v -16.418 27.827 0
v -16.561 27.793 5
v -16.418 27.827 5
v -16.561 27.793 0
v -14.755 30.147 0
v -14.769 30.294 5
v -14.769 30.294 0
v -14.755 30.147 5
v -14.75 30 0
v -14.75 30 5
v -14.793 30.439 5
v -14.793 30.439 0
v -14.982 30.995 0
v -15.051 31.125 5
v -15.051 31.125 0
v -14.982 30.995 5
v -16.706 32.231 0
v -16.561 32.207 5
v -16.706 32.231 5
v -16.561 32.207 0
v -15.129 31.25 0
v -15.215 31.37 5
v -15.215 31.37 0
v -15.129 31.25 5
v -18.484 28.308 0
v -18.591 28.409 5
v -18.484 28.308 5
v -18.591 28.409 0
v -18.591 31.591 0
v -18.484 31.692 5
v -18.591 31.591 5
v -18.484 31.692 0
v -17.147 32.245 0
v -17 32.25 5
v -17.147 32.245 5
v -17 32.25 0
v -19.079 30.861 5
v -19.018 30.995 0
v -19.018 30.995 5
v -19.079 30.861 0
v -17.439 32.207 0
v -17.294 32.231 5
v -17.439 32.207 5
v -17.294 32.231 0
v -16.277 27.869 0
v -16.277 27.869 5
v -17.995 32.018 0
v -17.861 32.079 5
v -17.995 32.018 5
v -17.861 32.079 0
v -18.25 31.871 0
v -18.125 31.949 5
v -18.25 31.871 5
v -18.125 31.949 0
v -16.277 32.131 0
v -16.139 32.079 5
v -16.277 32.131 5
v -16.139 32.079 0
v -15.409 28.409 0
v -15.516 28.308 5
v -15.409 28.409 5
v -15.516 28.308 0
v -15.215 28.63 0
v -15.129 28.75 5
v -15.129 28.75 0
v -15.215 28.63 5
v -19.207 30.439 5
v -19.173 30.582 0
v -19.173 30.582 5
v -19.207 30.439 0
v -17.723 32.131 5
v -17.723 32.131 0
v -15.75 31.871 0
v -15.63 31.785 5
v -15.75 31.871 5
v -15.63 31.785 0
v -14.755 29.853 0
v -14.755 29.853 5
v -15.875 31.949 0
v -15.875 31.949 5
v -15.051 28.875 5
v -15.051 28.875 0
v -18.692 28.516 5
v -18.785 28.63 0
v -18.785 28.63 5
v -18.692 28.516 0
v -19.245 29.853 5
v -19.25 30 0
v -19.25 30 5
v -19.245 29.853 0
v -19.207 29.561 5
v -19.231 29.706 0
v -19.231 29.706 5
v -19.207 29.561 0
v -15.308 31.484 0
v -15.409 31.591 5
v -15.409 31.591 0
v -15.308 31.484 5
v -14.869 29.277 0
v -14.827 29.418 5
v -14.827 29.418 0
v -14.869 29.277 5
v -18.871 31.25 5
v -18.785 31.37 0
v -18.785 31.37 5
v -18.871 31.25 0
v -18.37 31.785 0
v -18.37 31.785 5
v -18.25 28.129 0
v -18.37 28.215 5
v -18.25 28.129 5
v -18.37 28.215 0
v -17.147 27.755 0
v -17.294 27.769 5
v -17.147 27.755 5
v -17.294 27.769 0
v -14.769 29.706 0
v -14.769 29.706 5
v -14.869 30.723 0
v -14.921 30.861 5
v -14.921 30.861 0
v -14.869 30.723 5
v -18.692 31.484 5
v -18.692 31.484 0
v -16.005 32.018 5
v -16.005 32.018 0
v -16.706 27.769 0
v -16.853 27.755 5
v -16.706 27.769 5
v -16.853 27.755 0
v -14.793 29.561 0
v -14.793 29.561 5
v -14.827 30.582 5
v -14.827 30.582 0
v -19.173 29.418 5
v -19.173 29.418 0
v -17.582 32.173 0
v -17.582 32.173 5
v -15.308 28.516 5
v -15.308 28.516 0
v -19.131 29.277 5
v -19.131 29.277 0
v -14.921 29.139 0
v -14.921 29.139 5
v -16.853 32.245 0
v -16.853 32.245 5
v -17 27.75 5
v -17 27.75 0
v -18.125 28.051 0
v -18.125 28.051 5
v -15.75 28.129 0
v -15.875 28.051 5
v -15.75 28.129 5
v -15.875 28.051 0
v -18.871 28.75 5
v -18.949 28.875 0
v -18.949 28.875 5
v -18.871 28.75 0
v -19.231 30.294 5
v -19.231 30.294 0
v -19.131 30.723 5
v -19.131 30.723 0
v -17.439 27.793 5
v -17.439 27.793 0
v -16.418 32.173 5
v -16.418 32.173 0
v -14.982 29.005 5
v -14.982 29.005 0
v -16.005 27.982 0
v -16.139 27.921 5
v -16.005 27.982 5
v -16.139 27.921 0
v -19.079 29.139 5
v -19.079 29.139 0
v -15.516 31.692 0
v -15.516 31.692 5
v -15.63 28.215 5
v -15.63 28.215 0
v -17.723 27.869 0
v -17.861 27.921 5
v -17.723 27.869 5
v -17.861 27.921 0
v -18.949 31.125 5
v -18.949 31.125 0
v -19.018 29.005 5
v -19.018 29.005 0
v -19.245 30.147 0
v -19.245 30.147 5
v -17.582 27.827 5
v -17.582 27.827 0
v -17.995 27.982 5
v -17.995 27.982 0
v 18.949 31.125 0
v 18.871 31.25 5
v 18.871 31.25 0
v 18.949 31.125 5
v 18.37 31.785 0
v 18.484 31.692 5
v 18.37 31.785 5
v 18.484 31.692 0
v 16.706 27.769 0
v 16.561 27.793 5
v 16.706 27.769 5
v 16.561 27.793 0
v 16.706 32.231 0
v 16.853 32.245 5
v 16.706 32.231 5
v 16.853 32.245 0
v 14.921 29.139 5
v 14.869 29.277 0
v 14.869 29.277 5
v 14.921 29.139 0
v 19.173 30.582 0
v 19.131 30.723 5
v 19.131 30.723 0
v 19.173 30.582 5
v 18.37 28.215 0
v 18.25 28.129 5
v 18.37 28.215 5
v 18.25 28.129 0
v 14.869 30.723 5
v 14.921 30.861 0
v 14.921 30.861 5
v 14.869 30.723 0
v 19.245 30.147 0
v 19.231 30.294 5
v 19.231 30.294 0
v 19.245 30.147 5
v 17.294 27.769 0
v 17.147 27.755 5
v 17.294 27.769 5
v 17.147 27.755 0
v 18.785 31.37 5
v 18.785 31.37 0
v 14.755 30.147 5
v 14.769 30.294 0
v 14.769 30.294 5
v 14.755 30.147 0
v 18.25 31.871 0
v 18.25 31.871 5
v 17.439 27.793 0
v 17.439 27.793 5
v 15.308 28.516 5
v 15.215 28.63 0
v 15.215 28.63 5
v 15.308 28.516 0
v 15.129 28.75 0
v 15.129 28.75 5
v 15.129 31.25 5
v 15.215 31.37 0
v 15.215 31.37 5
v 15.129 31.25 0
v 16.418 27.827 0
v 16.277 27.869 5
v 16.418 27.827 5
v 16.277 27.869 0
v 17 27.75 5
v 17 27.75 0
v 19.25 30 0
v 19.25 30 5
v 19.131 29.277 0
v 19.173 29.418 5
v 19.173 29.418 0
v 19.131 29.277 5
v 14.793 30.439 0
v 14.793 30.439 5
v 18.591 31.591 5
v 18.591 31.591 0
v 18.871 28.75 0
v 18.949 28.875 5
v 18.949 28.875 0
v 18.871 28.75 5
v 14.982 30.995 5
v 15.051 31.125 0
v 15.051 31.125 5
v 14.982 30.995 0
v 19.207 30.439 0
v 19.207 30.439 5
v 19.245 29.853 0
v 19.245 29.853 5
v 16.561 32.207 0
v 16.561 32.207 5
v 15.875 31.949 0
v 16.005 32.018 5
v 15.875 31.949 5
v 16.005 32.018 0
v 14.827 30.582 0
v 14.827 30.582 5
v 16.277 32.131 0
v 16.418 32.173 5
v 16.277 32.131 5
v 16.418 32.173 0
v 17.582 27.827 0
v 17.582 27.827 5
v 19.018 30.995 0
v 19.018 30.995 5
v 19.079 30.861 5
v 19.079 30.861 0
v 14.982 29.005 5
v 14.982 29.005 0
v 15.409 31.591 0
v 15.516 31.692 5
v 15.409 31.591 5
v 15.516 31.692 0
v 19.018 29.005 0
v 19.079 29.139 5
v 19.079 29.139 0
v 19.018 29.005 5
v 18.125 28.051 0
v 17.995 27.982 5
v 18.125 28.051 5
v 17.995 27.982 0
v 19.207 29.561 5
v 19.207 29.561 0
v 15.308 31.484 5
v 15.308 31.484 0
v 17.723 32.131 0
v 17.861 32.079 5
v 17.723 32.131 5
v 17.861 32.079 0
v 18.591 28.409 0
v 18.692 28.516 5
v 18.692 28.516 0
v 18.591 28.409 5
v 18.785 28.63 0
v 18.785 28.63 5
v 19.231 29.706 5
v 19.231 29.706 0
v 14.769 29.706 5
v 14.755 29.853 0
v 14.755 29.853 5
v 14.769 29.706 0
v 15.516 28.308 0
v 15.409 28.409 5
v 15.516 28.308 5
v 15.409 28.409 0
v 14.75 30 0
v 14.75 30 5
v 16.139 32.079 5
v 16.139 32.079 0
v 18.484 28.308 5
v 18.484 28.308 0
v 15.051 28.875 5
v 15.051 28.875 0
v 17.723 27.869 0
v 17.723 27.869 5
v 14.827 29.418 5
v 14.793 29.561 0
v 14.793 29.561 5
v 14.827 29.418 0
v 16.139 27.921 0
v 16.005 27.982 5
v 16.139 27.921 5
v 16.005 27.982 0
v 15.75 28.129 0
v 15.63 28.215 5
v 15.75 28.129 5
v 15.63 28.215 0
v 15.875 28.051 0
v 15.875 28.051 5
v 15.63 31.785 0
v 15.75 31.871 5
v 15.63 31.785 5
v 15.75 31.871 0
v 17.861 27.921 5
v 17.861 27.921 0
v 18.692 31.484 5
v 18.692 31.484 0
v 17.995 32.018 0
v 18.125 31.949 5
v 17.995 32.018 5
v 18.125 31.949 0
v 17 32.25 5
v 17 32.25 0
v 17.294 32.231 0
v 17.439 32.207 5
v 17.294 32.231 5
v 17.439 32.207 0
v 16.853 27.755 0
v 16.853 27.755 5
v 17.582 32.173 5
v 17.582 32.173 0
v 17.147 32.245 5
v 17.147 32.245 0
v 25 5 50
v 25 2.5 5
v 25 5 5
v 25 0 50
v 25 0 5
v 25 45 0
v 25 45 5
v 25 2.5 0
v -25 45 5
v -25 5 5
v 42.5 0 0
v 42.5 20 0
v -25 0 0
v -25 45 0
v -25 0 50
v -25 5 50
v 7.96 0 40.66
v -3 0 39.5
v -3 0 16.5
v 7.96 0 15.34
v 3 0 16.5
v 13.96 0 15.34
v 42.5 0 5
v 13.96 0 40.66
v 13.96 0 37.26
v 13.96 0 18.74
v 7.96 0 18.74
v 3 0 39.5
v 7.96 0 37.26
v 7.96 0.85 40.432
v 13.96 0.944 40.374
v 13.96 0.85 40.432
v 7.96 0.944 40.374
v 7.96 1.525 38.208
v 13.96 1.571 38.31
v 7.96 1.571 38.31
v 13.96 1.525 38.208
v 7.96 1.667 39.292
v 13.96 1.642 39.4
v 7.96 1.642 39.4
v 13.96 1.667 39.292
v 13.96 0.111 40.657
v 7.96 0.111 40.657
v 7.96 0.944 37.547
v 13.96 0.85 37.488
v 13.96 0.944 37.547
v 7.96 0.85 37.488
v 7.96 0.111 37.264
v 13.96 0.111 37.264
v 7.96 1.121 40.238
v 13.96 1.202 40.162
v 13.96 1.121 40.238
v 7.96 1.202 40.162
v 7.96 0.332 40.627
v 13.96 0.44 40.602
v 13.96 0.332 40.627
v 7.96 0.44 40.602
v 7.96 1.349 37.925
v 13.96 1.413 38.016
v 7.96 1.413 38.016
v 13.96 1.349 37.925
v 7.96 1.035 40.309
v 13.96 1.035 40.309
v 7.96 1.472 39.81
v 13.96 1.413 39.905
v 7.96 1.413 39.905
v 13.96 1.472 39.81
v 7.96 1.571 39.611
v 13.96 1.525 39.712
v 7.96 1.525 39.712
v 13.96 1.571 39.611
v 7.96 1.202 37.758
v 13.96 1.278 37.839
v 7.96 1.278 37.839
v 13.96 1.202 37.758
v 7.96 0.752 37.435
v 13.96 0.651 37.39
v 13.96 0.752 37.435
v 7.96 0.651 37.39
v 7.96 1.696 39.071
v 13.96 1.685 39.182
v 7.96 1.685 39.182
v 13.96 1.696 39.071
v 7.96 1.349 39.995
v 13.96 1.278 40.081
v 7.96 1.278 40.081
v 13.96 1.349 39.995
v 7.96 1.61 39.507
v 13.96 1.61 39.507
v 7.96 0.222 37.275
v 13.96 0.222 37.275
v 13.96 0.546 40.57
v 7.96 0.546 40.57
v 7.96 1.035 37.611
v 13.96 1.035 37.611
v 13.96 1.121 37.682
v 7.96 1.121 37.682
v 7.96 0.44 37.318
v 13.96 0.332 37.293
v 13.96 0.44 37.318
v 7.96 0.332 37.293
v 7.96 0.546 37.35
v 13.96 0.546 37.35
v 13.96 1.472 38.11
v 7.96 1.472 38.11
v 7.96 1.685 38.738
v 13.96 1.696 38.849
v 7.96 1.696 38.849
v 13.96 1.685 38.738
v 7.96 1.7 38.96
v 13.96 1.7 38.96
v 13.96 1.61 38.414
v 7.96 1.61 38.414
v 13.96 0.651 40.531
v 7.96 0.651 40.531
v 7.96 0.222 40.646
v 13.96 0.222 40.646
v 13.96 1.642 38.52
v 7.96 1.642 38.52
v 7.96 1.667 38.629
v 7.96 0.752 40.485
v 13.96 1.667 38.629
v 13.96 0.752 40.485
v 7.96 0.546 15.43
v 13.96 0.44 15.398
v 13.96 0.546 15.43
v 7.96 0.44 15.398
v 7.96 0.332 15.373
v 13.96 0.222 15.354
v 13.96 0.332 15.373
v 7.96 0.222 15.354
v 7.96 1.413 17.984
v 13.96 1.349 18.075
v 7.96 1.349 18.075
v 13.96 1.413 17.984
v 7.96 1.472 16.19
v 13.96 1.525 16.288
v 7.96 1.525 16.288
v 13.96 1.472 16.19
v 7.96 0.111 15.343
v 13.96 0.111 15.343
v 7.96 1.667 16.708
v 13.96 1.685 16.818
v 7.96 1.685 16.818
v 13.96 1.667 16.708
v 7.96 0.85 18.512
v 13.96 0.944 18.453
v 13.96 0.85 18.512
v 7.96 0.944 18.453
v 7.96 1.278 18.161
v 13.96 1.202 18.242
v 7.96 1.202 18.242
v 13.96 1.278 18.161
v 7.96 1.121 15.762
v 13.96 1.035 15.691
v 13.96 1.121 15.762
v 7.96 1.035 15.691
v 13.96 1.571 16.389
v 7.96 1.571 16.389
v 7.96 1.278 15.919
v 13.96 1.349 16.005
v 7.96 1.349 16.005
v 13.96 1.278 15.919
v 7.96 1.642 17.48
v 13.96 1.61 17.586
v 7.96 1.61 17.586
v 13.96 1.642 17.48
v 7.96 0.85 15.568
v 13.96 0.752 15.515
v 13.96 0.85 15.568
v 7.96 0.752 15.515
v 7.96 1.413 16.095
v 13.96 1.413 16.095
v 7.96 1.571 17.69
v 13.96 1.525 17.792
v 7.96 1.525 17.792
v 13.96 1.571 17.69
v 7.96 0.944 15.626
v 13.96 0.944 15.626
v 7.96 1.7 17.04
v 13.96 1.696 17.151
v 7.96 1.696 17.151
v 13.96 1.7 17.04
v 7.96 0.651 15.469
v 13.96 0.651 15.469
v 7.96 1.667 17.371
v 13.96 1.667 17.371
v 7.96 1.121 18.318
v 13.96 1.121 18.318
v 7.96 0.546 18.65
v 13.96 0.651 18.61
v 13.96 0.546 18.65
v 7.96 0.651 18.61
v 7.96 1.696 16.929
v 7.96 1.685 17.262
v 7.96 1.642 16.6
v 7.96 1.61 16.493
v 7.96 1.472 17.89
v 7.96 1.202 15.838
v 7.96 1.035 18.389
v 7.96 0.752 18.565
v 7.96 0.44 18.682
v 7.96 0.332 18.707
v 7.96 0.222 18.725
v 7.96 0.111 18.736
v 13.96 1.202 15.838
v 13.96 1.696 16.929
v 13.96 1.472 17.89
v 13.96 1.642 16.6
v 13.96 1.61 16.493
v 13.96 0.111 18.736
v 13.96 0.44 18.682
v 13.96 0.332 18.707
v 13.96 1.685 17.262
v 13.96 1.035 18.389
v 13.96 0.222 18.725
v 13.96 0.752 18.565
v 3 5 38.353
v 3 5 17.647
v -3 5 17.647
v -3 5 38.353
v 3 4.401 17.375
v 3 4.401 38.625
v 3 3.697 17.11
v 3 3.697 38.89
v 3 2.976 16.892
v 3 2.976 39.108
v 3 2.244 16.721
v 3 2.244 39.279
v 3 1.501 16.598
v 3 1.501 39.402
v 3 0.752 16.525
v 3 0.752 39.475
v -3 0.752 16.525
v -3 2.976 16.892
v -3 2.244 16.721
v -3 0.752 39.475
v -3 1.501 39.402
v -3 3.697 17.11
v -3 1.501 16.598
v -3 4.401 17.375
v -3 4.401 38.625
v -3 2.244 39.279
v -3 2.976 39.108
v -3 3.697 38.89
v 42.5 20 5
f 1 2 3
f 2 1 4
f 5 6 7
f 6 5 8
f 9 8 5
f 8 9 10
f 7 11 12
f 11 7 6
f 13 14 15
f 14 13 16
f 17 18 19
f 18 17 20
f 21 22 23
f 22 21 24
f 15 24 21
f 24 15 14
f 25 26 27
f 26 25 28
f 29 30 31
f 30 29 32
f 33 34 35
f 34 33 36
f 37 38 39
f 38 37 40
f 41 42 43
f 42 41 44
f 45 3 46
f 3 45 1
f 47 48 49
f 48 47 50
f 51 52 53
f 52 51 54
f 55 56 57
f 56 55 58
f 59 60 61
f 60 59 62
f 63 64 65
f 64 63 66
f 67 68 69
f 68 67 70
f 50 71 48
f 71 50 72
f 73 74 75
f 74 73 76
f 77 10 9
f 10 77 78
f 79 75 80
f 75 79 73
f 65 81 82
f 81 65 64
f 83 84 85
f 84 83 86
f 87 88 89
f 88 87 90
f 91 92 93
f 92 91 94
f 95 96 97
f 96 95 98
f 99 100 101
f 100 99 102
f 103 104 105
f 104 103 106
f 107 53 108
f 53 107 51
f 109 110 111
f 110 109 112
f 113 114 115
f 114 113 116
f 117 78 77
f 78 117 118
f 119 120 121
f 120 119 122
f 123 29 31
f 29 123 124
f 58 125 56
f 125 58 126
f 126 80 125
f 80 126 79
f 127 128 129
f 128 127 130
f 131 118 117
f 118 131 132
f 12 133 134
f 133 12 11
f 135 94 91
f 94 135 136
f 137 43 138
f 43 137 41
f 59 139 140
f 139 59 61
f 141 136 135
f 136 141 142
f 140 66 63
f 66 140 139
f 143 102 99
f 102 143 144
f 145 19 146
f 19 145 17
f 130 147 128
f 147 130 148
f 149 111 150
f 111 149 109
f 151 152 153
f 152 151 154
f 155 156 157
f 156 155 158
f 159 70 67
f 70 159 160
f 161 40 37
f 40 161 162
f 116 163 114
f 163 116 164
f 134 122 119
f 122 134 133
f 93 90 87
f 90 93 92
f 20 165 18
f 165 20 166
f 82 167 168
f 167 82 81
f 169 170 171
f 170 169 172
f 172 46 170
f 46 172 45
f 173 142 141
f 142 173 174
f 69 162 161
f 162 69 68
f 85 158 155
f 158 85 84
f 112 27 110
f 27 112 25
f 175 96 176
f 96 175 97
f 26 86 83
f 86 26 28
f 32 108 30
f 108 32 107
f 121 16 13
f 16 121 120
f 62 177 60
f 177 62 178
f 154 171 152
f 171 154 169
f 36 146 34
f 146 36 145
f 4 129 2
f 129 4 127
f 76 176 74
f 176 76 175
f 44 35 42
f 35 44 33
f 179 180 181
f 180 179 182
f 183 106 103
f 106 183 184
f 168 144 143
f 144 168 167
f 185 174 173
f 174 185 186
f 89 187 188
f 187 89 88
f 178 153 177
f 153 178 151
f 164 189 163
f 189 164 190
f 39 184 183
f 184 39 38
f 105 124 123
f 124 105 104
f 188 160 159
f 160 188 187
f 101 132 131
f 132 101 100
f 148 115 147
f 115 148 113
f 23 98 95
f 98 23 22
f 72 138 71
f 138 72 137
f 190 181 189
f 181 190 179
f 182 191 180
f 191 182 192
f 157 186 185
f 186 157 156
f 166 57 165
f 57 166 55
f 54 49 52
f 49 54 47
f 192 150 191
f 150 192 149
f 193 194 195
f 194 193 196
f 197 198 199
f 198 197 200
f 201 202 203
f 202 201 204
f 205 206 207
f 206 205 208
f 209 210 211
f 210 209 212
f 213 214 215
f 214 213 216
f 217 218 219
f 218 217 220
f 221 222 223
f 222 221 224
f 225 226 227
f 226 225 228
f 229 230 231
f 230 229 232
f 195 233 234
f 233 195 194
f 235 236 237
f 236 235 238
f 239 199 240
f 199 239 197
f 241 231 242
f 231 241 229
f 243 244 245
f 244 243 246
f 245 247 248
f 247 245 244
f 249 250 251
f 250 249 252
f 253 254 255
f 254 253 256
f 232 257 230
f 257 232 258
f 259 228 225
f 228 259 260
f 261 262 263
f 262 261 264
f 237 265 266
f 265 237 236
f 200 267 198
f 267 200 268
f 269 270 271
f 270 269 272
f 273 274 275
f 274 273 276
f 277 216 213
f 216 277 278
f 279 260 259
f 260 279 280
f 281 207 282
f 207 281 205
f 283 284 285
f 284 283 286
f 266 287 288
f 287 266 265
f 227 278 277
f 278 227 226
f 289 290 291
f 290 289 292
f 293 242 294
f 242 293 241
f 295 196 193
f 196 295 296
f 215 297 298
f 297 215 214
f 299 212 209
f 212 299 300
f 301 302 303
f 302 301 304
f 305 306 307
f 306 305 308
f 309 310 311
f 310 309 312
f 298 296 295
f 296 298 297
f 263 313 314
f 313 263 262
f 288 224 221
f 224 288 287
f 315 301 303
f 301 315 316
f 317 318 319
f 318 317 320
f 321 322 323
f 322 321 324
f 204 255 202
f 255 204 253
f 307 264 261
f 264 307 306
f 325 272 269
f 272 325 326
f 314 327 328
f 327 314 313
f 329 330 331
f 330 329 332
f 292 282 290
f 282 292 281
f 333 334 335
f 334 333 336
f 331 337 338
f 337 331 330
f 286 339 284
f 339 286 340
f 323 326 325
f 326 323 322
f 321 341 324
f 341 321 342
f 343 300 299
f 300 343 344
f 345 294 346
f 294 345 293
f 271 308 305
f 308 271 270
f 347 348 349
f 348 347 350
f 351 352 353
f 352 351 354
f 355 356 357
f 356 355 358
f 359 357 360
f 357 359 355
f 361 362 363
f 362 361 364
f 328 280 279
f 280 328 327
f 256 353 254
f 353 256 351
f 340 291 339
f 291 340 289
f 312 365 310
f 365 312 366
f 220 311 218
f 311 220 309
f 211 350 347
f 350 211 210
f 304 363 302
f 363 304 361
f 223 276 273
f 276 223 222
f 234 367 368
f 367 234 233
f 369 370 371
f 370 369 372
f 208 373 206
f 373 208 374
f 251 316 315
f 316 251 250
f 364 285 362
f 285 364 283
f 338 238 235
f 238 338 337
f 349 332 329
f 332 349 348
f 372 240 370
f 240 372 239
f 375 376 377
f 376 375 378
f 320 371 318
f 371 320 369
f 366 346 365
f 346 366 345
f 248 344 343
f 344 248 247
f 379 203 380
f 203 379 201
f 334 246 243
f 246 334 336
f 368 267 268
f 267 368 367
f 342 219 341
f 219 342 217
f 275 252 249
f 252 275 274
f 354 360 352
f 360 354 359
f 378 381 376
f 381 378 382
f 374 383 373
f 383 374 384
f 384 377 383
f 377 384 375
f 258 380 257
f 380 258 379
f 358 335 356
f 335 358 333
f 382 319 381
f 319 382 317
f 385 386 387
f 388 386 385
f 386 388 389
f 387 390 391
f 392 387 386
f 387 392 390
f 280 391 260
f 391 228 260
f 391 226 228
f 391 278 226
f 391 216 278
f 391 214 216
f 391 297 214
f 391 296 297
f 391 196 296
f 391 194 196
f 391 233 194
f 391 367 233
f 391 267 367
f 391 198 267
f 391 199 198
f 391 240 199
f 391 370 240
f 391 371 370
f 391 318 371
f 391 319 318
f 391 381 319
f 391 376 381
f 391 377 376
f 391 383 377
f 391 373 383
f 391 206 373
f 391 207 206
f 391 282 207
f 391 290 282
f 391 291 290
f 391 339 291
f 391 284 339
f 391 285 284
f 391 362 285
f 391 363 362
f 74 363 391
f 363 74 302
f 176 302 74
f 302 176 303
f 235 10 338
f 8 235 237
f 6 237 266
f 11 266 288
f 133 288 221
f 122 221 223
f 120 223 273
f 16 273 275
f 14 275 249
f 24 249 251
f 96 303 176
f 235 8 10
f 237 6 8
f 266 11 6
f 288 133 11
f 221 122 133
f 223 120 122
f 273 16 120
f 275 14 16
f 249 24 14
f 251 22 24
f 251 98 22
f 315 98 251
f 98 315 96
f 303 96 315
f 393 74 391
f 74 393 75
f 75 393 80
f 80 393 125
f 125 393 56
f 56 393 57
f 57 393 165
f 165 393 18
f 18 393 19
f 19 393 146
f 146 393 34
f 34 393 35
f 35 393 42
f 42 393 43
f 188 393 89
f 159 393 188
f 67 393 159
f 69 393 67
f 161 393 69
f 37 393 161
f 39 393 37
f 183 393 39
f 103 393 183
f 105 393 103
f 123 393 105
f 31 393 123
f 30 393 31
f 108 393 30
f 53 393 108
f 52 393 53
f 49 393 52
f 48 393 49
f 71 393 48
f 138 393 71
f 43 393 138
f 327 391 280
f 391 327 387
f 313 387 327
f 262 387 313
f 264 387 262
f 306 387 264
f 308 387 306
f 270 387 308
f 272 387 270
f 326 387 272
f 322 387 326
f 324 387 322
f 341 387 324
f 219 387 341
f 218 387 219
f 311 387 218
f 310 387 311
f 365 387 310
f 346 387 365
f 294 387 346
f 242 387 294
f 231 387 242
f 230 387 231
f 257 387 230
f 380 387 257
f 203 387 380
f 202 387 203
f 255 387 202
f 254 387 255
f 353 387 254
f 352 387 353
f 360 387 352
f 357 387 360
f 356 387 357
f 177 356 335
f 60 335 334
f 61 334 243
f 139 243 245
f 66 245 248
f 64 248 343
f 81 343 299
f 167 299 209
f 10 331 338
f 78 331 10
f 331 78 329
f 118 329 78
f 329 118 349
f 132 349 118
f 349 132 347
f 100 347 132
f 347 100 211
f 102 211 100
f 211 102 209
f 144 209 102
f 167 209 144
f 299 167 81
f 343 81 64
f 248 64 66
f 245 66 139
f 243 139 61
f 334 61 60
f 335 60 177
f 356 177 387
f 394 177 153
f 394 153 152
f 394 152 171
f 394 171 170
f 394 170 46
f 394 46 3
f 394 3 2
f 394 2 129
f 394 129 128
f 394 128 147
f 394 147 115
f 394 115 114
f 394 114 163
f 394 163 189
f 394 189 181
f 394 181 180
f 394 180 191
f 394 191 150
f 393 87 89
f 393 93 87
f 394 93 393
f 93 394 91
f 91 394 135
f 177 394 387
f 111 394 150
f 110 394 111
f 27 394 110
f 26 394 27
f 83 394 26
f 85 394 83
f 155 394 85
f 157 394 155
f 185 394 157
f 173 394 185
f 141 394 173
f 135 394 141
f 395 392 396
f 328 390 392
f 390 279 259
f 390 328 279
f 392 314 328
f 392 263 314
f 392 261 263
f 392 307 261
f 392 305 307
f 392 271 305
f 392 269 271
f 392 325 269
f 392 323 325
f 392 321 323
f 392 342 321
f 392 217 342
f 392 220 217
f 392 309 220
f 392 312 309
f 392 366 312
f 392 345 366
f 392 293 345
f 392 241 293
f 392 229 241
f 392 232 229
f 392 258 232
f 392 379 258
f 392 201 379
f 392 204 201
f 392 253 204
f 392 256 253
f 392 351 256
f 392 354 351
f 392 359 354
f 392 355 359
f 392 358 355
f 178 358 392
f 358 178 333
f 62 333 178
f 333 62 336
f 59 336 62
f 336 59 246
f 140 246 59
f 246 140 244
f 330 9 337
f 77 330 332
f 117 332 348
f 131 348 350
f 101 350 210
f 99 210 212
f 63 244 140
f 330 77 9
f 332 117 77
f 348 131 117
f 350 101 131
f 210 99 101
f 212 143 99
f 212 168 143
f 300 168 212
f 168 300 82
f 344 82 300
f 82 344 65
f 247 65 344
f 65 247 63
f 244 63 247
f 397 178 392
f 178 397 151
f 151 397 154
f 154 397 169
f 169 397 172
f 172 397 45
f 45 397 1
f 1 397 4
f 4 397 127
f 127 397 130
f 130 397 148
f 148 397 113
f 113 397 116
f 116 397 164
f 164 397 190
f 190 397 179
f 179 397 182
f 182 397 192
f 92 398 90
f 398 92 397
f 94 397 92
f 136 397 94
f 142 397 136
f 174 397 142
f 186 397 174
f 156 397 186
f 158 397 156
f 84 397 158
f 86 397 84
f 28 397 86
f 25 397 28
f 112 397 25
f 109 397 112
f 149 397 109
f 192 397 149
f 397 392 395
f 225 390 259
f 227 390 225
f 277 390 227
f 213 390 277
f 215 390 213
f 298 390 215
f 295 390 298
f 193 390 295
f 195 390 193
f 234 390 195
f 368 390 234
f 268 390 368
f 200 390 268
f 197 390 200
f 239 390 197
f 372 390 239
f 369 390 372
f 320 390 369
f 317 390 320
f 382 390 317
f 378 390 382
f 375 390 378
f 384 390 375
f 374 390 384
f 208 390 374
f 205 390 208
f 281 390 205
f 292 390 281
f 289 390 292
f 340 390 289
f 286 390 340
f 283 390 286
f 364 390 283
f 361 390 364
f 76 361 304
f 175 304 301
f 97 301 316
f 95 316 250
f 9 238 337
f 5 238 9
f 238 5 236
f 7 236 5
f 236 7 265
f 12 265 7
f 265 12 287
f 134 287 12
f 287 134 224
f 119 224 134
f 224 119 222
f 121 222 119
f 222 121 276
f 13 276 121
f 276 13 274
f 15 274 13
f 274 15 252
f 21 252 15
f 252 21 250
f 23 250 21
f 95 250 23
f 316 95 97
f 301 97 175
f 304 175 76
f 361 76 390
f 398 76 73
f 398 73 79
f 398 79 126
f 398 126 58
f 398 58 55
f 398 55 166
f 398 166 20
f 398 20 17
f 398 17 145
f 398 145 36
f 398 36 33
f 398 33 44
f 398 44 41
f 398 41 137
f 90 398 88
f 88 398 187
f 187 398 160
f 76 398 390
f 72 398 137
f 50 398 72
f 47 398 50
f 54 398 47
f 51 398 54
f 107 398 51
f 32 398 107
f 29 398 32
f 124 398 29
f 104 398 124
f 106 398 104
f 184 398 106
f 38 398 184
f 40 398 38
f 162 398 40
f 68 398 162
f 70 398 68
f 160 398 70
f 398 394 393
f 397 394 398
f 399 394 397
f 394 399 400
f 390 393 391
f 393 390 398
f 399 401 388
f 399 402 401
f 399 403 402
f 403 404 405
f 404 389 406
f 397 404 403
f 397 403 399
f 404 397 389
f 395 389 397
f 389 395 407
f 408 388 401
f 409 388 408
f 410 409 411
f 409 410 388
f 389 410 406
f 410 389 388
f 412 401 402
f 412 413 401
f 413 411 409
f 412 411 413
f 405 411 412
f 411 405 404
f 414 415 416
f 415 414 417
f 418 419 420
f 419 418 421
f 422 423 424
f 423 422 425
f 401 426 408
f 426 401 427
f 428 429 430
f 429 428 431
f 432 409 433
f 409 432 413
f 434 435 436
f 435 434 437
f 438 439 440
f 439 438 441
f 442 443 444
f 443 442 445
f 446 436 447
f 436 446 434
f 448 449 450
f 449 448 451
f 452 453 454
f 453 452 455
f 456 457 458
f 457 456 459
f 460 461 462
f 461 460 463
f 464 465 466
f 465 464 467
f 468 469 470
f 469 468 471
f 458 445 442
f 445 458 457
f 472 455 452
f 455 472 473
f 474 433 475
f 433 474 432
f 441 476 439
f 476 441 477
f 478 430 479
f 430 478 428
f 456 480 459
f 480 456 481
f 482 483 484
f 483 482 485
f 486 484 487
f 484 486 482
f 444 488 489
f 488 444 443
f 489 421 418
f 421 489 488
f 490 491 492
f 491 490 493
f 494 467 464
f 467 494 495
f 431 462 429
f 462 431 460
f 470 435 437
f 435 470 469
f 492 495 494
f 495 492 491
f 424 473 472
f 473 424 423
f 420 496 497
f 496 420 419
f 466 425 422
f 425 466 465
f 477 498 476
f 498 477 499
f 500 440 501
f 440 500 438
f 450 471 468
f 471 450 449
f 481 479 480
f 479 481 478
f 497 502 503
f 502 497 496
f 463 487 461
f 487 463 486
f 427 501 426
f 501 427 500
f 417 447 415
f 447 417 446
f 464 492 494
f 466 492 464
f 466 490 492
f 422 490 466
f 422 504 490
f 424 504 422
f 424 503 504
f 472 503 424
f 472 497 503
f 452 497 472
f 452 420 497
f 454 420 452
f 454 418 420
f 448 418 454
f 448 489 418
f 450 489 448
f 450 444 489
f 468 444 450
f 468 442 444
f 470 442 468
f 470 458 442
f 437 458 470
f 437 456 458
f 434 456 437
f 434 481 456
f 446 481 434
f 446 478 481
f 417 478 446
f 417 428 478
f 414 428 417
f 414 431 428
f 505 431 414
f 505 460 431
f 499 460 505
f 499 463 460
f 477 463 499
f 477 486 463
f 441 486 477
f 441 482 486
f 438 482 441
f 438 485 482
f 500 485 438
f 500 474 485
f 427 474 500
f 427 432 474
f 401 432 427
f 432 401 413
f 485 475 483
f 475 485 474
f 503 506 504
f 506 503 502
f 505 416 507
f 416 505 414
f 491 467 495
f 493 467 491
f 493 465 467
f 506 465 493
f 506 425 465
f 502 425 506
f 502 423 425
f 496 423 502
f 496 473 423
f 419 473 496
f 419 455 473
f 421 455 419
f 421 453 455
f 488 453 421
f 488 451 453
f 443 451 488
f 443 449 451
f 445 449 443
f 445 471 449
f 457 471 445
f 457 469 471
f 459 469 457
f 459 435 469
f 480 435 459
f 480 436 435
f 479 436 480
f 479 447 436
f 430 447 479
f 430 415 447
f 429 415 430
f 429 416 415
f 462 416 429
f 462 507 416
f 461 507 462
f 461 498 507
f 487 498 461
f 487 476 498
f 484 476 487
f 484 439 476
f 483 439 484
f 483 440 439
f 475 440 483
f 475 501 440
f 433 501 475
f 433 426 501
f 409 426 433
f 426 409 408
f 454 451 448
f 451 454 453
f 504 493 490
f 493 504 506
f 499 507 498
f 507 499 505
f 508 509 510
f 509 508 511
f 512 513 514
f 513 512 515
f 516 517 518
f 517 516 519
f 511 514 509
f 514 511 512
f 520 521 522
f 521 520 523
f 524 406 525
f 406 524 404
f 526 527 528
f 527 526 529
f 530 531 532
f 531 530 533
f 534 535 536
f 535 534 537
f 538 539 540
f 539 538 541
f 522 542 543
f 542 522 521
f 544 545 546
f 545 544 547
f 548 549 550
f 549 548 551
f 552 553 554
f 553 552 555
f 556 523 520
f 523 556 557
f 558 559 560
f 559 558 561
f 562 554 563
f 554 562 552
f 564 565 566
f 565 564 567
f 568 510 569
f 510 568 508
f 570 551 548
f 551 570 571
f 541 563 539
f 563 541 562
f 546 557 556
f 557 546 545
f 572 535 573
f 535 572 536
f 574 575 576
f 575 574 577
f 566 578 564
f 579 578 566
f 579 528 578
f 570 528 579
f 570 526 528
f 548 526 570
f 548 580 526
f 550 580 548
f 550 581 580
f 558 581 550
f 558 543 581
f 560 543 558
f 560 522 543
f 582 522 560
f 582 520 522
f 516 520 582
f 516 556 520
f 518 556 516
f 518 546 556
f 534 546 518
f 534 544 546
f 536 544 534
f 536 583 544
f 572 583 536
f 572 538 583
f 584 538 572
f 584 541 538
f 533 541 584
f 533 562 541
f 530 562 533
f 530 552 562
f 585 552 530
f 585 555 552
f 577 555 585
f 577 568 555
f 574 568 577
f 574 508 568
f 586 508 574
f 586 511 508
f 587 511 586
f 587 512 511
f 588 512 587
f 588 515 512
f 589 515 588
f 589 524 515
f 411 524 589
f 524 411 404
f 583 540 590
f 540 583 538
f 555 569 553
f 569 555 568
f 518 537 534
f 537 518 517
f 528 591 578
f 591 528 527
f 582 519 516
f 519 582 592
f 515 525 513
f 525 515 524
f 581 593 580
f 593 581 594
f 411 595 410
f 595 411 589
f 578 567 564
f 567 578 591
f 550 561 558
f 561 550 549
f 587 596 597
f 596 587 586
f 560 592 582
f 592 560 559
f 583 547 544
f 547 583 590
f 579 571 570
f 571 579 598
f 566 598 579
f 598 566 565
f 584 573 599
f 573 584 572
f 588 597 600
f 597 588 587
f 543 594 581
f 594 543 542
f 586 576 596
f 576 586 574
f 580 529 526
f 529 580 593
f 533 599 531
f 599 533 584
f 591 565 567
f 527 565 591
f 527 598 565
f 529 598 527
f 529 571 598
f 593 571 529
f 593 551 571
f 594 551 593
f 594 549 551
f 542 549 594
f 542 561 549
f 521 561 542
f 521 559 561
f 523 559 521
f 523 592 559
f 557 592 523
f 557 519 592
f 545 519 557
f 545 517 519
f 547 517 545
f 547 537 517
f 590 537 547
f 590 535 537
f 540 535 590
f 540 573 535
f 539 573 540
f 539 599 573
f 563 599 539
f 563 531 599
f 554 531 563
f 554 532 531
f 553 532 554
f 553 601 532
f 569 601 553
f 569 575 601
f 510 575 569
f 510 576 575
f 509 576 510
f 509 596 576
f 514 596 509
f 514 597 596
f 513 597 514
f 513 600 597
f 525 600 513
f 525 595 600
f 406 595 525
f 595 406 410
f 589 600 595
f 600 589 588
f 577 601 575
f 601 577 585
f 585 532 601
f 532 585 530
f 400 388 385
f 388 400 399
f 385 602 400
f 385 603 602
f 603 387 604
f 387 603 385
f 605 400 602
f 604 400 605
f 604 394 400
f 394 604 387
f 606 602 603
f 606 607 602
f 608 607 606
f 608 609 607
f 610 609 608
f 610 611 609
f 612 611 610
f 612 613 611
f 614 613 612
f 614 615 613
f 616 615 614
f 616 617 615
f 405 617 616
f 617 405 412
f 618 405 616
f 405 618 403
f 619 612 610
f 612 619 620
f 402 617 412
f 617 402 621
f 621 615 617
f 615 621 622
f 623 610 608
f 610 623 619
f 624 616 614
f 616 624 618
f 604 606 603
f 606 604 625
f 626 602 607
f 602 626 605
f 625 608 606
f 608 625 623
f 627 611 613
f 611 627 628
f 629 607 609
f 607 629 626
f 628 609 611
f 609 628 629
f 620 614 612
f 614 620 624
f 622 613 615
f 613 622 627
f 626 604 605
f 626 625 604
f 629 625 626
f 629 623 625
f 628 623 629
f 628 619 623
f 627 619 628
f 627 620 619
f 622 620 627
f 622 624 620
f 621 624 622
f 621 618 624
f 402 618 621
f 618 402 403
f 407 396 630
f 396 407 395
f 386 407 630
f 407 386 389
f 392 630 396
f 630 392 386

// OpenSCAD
// L-shaped mounting bracket for a NEMA 17 stepper motor (e.g. syringe pump)
// Print orientation: base plate on the bed, vertical plate builds upward (+Z)

// ---------------- Parameters ----------------
plate_t      = 5;     // base plate thickness (Z)
base_x0      = -25;   // base plate left edge (X)
base_x1      = 25;    // base plate right edge (X)
base_y0      = 0;     // base plate front edge (Y)
base_y1      = 45;    // base plate back edge (Y)

motor_h      = 50;    // vertical motor plate height (Z)
motor_x0     = -25;   // motor plate left edge (X)
motor_x1     = 25;    // motor plate right edge (X)
motor_y0     = 0;     // motor plate front edge (Y)
motor_y1     = 5;     // motor plate back edge (Y)

boss_d       = 23;    // motor centring boss hole diameter
boss_x       = 0;     // boss hole centre X
boss_z       = 28;    // boss hole centre Z
boss_screw_d = 3.4;   // M3 screw holes diameter
boss_screw_n = 4;     // number of screw holes
boss_screw_a = 31;    // screw hole pattern size (square side)

gusset_t     = 5;     // gusset thickness (X)
gusset_y     = 20;    // gusset leg along +Y
gusset_z     = 20;    // gusset leg along +Z

eps          = 0.5;   // cutter overshoot past faces
$fn          = 96;    // curve resolution

// ---------------- Model ----------------
union() {
    // Base plate with two vertical through-holes (M4) at y = 30
    difference() {
        translate([base_x0, base_y0, 0])
            cube([base_x1 - base_x0, base_y1 - base_y0, plate_t]);
        for (sx = [-17, 17])
            translate([sx, base_y1 - 15, -eps])
                cylinder(d = 4.5, h = plate_t + 2 * eps);
    }

    // Vertical motor plate standing on the back edge of the base
    difference() {
        translate([motor_x0, motor_y0, 0])
            cube([motor_x1 - motor_x0, motor_y1 - motor_y0, motor_h]);
        // Boss hole along Y, centred at x = 0, z = 28
        translate([boss_x, 0, boss_z])
            rotate([0, 90, 0])
                cylinder(d = boss_d, h = motor_y1 - motor_y0 + 2 * eps, center = true);
        // M3 screw holes on a 31 mm square pattern, centred on the boss hole
        for (i = [0 : boss_screw_n - 1]) {
            a = boss_screw_a / 2 * sqrt(2);   // circumradius of the square
            r = a * cos(45 + i * 360 / boss_screw_n);
            x = boss_x + r * cos(45 + i * 360 / boss_screw_n);
            y = boss_z + r * sin(45 + i * 360 / boss_screw_n);
            translate([x, 0, y])
                rotate([0, 90, 0])
                    cylinder(d = boss_screw_d, h = motor_y1 - motor_y0 + 2 * eps, center = true);
        }
    }

    // Two triangular gussets, flush with the left and right edges
    for (off = [-1, 1]) {
        x0 = off * 22.5;   // gusset start X (-20 or +20)
        translate([x0, motor_y0, motor_y0])
            linear_extrude(height = gusset_t)
                polygon([[0, 0], [gusset_y, 0], [gusset_y, gusset_z]]);
    }
}
